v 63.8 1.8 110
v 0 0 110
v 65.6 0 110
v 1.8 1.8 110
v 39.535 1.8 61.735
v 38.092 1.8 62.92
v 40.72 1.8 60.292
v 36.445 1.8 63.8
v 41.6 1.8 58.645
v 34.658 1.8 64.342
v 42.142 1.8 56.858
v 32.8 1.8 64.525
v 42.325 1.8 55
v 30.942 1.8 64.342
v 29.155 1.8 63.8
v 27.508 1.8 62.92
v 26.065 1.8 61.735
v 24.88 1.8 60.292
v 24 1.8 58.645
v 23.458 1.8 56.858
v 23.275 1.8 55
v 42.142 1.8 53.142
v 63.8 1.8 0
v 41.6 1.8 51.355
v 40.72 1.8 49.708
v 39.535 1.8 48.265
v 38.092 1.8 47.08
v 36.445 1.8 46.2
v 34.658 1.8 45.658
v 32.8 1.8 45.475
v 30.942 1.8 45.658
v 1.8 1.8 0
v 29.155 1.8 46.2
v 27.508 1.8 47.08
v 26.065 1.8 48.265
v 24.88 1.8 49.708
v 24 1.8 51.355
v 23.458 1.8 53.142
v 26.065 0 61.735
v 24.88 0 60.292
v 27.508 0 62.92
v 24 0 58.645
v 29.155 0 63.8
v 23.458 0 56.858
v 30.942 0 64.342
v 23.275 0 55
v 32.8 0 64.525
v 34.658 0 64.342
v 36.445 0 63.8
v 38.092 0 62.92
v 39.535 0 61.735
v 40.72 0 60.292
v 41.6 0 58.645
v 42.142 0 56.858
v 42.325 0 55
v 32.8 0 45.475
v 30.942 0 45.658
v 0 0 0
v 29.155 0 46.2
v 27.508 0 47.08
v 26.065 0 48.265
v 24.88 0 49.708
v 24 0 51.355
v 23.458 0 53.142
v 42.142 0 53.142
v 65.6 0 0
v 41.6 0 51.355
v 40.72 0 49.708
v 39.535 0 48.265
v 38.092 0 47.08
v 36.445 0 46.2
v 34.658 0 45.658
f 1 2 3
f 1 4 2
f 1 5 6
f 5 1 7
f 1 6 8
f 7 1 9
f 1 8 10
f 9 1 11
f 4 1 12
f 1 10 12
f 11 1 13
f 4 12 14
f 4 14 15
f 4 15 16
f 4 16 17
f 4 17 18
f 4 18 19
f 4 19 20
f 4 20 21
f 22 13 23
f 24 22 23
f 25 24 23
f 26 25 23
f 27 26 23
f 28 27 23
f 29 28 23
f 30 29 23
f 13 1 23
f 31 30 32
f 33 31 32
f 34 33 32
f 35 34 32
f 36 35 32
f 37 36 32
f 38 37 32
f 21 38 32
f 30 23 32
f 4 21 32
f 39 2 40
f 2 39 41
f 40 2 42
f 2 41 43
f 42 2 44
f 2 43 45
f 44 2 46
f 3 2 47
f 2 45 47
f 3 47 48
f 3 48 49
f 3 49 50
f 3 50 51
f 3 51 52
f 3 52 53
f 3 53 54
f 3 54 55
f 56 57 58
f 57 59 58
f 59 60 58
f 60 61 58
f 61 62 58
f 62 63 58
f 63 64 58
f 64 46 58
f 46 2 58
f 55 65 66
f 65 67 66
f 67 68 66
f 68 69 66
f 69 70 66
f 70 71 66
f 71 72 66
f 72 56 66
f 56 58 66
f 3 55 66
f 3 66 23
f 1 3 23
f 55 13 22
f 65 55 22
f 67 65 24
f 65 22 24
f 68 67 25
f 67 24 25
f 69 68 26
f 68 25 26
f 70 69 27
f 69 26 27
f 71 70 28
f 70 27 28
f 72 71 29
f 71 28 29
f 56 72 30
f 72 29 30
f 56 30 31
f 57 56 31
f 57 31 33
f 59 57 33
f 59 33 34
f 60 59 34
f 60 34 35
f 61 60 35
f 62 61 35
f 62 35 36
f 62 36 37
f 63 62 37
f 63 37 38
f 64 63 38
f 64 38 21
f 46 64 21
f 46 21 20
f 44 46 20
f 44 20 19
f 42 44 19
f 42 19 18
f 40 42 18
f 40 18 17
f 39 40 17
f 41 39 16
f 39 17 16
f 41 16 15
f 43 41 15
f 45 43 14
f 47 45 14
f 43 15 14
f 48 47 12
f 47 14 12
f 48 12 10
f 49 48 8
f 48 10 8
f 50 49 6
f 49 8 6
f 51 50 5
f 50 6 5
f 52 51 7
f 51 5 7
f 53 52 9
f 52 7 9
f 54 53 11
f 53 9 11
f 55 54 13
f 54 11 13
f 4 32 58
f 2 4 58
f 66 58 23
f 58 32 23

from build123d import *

# Parameters (mm, degrees)
BOSS_EXTRUDE1_DEPTH = 110
SKETCH2_R           = 9.525
CUT_EXTRUDE1_DEPTH  = 2.8


with BuildPart() as part:
    # Sketch1 → Boss-Extrude1 (new body)
    with BuildSketch(Plane.XY):
        Polygon((0, 0), (65.6, 0), (63.8, 1.8), (1.8, 1.8), align=None)
    extrude(amount=BOSS_EXTRUDE1_DEPTH)

    # Sketch2 → Cut-Extrude1 (cut, through all)
    with BuildSketch(Plane(origin=(0, 1.8, 0), x_dir=(1, 0, 0), z_dir=(0, 1, 0))):
        with Locations((32.8, -55)):
            Circle(SKETCH2_R)
    extrude(amount=-CUT_EXTRUDE1_DEPTH, mode=Mode.SUBTRACT)


solid = part.part
